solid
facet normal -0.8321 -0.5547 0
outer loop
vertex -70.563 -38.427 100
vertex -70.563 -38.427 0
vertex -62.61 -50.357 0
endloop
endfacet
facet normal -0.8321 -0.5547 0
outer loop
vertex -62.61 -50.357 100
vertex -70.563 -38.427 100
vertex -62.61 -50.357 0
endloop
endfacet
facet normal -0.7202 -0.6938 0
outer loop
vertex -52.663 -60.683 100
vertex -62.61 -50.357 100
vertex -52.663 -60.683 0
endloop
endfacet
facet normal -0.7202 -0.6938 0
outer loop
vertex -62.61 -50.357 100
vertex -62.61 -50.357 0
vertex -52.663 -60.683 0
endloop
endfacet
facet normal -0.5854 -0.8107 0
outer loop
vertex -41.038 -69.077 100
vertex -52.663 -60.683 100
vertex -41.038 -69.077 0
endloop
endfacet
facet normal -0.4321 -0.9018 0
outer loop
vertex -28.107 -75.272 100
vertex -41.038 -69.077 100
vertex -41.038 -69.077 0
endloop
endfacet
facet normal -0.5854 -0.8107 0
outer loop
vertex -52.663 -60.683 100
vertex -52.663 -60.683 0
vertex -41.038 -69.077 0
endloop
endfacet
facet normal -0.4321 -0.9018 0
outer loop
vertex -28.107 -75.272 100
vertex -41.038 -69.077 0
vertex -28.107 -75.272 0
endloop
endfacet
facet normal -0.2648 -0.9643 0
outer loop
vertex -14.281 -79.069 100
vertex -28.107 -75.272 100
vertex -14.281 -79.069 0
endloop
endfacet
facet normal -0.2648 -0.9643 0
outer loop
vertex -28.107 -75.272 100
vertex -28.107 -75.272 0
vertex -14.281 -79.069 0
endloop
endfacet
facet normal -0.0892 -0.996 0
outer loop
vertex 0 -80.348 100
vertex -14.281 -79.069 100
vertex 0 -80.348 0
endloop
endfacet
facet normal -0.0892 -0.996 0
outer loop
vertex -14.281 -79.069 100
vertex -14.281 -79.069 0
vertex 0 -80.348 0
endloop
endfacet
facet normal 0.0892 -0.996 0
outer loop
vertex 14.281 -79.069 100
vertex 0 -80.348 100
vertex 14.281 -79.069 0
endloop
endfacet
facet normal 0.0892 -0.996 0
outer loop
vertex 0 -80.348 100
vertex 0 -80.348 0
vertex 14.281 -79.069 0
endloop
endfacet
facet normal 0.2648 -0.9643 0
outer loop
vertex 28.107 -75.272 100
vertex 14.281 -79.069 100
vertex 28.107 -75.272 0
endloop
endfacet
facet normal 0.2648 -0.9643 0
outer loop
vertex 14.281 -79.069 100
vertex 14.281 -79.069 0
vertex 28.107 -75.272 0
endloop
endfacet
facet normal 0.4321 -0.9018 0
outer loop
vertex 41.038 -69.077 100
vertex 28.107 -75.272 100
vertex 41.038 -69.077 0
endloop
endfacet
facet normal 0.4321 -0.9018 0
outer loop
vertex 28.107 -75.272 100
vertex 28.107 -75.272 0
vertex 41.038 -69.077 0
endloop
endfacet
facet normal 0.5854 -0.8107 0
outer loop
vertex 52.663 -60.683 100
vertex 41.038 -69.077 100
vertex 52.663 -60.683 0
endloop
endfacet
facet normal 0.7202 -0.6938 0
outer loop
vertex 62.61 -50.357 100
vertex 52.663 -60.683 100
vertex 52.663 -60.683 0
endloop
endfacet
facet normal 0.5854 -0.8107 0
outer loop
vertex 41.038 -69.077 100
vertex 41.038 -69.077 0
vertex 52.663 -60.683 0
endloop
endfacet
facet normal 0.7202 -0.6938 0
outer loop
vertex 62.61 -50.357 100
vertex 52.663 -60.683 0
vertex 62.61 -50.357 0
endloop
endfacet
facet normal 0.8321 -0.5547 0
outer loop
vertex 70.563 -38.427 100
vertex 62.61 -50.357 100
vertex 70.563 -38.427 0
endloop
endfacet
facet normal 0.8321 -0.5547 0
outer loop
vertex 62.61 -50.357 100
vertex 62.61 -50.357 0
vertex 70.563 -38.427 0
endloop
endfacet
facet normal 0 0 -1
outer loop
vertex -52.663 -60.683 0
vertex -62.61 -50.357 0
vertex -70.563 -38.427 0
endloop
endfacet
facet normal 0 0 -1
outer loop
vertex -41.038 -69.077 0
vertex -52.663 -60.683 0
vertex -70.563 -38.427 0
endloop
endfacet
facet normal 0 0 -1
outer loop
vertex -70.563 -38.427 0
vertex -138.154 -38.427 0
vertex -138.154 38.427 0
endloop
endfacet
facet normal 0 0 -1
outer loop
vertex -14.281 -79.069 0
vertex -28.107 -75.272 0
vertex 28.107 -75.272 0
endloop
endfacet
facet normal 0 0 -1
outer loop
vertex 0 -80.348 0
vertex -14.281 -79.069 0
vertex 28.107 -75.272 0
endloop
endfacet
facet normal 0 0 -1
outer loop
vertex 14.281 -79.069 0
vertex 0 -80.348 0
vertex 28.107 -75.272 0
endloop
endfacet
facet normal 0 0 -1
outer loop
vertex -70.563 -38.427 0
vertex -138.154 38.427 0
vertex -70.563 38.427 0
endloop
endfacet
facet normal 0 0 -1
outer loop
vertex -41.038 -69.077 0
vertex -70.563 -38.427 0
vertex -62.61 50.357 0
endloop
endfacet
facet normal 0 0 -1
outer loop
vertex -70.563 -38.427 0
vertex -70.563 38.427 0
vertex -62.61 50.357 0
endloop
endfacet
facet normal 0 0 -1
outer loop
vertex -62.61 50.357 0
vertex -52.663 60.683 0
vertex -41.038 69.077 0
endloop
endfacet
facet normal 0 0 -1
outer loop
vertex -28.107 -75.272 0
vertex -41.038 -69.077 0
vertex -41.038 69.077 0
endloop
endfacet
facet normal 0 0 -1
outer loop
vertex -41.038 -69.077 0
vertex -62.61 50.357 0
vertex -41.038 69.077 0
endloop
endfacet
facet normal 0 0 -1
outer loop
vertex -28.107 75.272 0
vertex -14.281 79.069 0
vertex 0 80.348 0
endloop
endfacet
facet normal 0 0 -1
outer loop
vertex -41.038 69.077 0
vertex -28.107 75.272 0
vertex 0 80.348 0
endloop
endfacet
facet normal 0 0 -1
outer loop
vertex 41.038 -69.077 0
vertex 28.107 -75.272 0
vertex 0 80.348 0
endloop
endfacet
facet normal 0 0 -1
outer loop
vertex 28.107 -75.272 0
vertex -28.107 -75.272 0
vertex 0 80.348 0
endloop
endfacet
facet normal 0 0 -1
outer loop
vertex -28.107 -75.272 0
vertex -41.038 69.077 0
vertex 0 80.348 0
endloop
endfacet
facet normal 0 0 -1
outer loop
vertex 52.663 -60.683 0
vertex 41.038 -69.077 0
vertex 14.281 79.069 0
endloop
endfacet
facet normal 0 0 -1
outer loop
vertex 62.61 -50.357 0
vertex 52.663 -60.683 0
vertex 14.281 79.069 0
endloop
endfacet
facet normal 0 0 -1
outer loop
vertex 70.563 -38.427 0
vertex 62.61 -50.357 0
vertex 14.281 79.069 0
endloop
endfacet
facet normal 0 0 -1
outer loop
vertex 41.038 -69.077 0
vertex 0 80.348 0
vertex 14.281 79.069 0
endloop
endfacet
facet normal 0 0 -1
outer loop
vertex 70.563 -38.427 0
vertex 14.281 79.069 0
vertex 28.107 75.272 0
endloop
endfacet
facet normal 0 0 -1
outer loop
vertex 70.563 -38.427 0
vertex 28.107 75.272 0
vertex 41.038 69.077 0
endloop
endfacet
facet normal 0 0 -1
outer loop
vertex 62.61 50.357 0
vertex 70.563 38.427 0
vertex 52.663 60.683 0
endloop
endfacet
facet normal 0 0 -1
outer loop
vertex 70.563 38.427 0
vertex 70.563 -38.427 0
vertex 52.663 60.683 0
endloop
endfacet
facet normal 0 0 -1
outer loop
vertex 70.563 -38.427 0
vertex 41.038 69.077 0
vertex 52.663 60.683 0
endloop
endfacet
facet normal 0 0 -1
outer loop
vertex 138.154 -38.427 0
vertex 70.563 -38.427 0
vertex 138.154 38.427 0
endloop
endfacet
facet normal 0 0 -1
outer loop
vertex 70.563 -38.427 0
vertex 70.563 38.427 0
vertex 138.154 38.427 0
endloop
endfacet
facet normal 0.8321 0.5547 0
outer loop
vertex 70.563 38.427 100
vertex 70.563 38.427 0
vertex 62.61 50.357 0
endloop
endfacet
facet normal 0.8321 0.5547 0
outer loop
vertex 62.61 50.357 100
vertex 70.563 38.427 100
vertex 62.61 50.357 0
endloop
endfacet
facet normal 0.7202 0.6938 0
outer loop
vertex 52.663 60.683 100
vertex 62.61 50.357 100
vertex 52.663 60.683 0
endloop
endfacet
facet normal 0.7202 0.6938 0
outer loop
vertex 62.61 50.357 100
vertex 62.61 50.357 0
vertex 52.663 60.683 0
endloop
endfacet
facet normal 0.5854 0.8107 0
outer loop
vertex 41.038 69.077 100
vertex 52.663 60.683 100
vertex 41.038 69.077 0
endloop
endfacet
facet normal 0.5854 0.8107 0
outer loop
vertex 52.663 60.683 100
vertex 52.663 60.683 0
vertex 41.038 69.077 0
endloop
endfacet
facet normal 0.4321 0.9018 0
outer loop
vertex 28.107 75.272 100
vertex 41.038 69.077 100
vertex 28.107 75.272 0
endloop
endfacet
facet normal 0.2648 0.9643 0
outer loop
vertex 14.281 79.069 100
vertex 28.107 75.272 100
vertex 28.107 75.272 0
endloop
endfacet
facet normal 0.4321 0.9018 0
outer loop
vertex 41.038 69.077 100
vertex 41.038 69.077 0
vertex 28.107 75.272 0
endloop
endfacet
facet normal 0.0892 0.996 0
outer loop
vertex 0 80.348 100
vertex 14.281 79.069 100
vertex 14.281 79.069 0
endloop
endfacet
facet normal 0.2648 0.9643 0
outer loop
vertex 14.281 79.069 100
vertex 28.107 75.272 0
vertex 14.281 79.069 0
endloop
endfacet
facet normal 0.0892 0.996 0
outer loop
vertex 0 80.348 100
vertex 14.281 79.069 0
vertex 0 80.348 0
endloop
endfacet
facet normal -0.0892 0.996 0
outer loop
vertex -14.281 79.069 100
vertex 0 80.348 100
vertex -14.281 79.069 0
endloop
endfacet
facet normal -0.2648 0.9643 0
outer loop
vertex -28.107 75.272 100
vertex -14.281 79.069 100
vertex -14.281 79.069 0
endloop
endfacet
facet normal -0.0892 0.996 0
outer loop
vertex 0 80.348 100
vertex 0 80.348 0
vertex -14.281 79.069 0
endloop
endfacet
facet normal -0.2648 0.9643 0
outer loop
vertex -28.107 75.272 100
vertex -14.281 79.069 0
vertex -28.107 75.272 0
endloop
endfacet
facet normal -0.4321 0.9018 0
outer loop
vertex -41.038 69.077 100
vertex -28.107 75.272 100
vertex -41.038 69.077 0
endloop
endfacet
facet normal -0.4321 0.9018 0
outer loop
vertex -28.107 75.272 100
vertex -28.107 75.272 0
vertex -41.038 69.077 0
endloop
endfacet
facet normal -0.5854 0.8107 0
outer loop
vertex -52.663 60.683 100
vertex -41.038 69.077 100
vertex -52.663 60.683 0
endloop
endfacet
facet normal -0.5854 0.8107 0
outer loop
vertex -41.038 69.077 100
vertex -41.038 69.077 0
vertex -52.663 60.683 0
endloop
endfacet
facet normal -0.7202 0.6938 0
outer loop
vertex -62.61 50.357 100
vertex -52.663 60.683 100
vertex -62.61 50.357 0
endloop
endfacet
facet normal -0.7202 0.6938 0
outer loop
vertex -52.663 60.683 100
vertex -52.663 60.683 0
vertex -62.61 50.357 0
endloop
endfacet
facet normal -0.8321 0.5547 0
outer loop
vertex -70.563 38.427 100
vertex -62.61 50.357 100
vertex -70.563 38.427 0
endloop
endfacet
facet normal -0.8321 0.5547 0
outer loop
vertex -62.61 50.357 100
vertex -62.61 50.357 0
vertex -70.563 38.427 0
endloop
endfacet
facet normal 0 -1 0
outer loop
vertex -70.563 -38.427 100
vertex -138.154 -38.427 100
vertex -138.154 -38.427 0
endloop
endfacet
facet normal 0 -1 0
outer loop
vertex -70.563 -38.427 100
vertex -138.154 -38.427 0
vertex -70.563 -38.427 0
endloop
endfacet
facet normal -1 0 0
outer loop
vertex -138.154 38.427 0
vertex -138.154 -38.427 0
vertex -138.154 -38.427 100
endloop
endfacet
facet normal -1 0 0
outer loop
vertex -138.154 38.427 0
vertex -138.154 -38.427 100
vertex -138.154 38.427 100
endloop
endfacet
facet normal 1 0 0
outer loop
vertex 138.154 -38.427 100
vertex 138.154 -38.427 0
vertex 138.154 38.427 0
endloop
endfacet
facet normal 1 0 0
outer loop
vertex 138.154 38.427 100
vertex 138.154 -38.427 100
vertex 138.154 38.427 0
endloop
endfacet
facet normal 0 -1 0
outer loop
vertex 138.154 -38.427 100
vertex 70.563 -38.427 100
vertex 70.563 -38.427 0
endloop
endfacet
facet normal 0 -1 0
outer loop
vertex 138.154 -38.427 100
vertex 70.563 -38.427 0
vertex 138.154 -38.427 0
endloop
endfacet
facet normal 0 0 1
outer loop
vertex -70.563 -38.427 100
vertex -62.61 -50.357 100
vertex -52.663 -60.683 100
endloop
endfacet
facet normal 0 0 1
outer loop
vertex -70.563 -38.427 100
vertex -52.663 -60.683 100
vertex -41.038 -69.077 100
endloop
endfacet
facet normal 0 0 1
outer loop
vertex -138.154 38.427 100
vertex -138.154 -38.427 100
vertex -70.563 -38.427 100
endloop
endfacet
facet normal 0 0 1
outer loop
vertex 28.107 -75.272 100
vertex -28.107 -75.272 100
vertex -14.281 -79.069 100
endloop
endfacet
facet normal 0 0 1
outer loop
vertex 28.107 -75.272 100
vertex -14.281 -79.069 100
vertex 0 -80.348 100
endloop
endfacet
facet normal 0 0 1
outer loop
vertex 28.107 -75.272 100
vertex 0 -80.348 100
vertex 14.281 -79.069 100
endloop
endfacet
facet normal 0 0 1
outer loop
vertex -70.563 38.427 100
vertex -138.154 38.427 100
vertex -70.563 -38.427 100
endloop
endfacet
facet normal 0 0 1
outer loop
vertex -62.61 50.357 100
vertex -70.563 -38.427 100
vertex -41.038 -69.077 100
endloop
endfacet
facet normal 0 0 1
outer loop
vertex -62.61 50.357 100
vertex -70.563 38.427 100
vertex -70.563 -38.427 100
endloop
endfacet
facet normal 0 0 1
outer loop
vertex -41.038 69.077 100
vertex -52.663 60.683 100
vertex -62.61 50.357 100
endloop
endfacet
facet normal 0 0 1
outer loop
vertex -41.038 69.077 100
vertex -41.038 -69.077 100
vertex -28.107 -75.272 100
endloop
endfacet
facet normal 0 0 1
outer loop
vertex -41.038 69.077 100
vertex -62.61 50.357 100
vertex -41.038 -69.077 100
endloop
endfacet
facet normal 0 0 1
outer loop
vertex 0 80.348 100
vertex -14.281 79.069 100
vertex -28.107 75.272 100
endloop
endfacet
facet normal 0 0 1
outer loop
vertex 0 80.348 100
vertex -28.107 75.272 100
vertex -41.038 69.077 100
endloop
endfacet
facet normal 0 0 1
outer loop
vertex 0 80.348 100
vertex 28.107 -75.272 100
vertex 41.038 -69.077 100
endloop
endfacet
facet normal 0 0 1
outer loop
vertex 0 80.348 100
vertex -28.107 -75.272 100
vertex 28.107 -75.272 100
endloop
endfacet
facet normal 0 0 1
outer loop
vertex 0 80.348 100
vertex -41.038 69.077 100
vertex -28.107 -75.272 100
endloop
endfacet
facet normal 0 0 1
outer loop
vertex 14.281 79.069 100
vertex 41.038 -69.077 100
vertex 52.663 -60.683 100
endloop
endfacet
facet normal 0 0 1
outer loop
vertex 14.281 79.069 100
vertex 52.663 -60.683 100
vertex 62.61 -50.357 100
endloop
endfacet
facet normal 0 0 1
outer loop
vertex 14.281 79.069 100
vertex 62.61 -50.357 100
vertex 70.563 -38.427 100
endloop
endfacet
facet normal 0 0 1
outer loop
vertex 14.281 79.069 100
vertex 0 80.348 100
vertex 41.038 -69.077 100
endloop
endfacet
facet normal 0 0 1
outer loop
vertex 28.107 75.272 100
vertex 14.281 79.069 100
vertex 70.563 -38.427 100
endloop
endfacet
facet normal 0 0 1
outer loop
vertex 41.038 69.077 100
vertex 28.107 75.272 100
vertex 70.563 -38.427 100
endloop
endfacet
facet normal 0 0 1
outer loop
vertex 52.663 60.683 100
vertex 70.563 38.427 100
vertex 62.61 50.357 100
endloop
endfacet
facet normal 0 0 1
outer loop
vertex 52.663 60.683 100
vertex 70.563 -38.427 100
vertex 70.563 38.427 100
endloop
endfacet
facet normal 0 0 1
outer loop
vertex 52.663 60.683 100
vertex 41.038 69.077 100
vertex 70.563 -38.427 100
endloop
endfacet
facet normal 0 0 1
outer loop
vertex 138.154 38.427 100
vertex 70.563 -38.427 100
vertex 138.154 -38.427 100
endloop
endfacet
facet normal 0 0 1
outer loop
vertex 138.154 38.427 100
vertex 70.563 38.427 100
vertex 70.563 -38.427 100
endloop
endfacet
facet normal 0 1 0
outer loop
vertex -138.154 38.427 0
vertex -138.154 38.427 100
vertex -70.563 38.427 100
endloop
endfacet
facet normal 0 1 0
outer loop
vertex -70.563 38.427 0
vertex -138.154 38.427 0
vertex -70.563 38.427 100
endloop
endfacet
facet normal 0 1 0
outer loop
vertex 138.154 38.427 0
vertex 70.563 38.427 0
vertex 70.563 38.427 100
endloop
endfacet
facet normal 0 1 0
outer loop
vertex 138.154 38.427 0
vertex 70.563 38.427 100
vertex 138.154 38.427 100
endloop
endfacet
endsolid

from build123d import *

# Parameters (mm, degrees)
SKETCH_1_R      = 80.348196739
SKETCH_1_W      = 276.308595414
SKETCH_1_H      = 76.854046406
EXTRUDE_1_DEPTH = 100


with BuildPart() as part:
    # 草图1 → 凸台-拉伸1 (new body)
    with BuildSketch(Plane.XY):
        Circle(SKETCH_1_R)
        Rectangle(SKETCH_1_W, SKETCH_1_H)
    extrude(amount=EXTRUDE_1_DEPTH)


solid = part.part
